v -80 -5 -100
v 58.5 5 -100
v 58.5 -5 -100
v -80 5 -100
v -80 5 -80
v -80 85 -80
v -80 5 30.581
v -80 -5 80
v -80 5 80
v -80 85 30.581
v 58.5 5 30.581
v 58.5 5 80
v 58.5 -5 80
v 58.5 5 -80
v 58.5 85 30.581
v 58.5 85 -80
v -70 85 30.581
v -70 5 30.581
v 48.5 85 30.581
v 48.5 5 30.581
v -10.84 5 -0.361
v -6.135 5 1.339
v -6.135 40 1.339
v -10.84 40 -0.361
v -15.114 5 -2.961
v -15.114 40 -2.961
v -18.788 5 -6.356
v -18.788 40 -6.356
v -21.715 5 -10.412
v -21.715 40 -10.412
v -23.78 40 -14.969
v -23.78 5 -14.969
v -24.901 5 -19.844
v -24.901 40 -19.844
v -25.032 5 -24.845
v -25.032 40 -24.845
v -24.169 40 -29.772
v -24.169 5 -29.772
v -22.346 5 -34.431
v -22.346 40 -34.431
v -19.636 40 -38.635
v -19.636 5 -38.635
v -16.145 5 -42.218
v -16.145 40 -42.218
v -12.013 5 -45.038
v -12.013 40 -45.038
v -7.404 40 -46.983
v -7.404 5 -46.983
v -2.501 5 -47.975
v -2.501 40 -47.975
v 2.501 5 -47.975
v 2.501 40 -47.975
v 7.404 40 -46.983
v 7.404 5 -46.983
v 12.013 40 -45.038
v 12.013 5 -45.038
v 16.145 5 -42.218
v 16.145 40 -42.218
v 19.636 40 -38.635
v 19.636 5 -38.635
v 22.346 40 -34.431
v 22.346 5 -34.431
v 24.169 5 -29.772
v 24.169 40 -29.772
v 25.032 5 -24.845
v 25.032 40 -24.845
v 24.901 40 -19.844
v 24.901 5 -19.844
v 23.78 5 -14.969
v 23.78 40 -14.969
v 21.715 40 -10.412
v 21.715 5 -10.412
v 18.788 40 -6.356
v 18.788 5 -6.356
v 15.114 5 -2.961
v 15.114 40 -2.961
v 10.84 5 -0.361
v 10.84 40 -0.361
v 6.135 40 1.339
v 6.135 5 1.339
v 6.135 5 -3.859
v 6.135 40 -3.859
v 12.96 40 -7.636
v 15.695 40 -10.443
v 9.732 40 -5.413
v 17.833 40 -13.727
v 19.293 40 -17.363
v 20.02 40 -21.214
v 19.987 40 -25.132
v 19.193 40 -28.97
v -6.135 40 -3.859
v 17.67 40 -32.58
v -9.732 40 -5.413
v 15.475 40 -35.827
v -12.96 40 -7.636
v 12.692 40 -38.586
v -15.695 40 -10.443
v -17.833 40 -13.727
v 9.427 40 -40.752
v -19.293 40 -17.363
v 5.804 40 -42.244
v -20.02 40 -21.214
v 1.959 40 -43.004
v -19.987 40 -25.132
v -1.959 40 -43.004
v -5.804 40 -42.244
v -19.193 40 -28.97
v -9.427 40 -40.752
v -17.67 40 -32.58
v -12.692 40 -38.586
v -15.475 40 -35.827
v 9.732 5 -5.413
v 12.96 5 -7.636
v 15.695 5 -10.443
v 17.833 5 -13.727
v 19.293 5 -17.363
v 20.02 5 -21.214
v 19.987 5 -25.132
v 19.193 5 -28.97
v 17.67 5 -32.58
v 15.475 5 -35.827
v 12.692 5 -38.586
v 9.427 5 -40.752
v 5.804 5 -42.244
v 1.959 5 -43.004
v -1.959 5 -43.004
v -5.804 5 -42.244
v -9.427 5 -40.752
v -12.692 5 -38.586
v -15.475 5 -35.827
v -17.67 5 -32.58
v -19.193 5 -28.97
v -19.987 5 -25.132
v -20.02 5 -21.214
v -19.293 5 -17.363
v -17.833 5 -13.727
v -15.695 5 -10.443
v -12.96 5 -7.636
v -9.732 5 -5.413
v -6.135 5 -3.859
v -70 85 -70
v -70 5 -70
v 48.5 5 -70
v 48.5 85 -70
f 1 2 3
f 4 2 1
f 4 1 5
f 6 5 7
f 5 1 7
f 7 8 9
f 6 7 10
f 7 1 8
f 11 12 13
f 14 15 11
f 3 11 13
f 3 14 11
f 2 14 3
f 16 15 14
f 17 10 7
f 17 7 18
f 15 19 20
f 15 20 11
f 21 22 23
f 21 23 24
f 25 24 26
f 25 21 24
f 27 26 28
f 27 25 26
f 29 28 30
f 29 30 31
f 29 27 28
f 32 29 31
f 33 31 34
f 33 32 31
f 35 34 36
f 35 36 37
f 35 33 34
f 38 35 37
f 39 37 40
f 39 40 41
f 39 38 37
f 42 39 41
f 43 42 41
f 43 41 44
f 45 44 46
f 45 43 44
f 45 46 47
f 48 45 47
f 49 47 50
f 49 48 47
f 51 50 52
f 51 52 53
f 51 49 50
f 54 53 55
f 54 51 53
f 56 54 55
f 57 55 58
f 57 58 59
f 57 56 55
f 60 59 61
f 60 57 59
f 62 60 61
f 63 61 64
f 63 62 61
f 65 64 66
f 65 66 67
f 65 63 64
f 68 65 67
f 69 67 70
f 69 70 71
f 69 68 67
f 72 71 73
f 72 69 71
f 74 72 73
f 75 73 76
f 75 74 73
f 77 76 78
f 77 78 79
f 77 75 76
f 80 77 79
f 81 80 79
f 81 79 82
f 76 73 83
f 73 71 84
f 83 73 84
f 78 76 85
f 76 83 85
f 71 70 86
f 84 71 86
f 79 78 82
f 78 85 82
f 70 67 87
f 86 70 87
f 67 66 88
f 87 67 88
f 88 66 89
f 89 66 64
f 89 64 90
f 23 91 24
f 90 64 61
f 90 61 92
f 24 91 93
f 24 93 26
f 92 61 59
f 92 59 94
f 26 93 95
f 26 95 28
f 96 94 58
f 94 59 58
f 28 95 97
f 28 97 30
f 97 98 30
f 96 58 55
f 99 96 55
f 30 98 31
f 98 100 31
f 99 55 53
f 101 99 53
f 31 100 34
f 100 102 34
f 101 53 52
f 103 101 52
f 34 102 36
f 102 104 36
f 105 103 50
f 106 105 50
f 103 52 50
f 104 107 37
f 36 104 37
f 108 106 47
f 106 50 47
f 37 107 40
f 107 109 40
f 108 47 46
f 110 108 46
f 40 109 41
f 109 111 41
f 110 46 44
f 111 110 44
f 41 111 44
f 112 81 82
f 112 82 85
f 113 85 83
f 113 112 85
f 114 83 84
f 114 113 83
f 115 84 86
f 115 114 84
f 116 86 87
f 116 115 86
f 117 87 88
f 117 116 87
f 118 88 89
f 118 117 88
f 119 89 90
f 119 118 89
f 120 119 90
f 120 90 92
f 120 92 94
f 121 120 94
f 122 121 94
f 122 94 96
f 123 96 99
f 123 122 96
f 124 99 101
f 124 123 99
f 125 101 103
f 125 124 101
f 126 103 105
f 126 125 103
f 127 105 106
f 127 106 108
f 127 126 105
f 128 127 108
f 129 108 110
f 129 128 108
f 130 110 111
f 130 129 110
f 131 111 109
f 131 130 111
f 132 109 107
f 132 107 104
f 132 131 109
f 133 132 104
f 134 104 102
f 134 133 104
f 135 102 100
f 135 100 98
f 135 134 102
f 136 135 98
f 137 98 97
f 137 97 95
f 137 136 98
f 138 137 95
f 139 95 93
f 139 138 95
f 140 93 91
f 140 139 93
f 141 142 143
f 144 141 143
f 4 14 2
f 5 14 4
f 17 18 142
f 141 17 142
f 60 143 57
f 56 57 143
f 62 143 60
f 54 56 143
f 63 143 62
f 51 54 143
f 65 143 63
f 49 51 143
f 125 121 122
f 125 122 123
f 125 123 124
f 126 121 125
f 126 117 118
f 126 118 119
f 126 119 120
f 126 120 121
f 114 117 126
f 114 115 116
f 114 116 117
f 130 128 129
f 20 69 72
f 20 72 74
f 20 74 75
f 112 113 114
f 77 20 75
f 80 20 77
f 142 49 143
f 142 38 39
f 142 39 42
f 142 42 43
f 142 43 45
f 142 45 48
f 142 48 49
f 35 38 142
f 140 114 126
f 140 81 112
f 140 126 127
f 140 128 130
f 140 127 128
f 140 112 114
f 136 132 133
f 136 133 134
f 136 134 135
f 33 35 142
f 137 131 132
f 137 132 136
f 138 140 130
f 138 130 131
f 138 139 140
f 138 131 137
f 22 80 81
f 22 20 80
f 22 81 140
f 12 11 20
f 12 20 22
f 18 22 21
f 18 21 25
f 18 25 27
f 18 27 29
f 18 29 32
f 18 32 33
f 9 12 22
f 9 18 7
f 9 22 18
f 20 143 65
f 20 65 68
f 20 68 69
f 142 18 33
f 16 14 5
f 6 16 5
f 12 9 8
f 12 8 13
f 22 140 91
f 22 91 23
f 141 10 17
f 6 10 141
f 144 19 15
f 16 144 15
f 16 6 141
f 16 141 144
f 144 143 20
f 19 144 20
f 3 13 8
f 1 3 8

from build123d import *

# Parameters (mm, degrees)
SKETCH1_W            = 160
SKETCH1_H            = 160
BOSS_EXTRUDE1_DEPTH  = 5
BOSS_EXTRUDE8_DEPTH  = 35
BOSS_EXTRUDE11_DEPTH = 80
SKETCH23_W           = 160
SKETCH23_H           = 10
BOSS_EXTRUDE12_DEPTH = 20
SKETCH25_W           = 21.5
SKETCH25_H           = 180
CUT_EXTRUDE4_DEPTH   = 10


with BuildPart() as part:
    # Sketch1 → Boss-Extrude1 (new, symmetric)
    with BuildSketch(Plane(origin=(0, 0, 0), x_dir=(1, 0, 0), z_dir=(0, 1, 0))):
        Rectangle(SKETCH1_W, SKETCH1_H)
    extrude(amount=BOSS_EXTRUDE1_DEPTH, both=True)

    # Sketch17 → Boss-Extrude8 (add)
    with BuildSketch(Plane(origin=(0, 5, 0), x_dir=(1, 0, 0), z_dir=(0, 1, 0))):
        with BuildLine():
            Line((-6.135166846, 3.859212979), (-6.135166846, -1.338646794))
            ThreePointArc((-6.135166846, -1.338646794), (0, 48.1), (6.135166846, -1.338646794))
            Line((6.135166846, -1.338646794), (6.135166846, 3.859212979))
            ThreePointArc((6.135166846, 3.859212979), (0, 43.1), (-6.135166846, 3.859212979))
        make_face()
    extrude(amount=BOSS_EXTRUDE8_DEPTH)

    # Sketch19 → Boss-Extrude11 (add)
    with BuildSketch(Plane(origin=(0, 5, 0), x_dir=(1, 0, 0), z_dir=(0, 1, 0))):
        Polygon((-80, 80), (-80, -30.581038256), (-70, -30.581038256), (-70, 70), (48.5, 70), (48.5, 25.826966248), (48.5, -30.581038256), (58.5, -30.581038256), (58.5, 25.826966248), (58.5, 74), (58.5, 80), (-70, 80), align=None)
    extrude(amount=BOSS_EXTRUDE11_DEPTH)

    # Sketch23 → Boss-Extrude12 (add)
    with BuildSketch(Plane(origin=(0, 0, -80), x_dir=(-1, 0, 0), z_dir=(0, 0, -1))):
        Rectangle(SKETCH23_W, SKETCH23_H)
    extrude(amount=BOSS_EXTRUDE12_DEPTH)

    # Sketch25 → Cut-Extrude4 (cut)
    with BuildSketch(Plane(origin=(0, 5, 0), x_dir=(1, 0, 0), z_dir=(0, 1, 0))):
        with Locations((69.25, 10)):
            Rectangle(SKETCH25_W, SKETCH25_H)
    extrude(amount=-CUT_EXTRUDE4_DEPTH, mode=Mode.SUBTRACT)


solid = part.part
